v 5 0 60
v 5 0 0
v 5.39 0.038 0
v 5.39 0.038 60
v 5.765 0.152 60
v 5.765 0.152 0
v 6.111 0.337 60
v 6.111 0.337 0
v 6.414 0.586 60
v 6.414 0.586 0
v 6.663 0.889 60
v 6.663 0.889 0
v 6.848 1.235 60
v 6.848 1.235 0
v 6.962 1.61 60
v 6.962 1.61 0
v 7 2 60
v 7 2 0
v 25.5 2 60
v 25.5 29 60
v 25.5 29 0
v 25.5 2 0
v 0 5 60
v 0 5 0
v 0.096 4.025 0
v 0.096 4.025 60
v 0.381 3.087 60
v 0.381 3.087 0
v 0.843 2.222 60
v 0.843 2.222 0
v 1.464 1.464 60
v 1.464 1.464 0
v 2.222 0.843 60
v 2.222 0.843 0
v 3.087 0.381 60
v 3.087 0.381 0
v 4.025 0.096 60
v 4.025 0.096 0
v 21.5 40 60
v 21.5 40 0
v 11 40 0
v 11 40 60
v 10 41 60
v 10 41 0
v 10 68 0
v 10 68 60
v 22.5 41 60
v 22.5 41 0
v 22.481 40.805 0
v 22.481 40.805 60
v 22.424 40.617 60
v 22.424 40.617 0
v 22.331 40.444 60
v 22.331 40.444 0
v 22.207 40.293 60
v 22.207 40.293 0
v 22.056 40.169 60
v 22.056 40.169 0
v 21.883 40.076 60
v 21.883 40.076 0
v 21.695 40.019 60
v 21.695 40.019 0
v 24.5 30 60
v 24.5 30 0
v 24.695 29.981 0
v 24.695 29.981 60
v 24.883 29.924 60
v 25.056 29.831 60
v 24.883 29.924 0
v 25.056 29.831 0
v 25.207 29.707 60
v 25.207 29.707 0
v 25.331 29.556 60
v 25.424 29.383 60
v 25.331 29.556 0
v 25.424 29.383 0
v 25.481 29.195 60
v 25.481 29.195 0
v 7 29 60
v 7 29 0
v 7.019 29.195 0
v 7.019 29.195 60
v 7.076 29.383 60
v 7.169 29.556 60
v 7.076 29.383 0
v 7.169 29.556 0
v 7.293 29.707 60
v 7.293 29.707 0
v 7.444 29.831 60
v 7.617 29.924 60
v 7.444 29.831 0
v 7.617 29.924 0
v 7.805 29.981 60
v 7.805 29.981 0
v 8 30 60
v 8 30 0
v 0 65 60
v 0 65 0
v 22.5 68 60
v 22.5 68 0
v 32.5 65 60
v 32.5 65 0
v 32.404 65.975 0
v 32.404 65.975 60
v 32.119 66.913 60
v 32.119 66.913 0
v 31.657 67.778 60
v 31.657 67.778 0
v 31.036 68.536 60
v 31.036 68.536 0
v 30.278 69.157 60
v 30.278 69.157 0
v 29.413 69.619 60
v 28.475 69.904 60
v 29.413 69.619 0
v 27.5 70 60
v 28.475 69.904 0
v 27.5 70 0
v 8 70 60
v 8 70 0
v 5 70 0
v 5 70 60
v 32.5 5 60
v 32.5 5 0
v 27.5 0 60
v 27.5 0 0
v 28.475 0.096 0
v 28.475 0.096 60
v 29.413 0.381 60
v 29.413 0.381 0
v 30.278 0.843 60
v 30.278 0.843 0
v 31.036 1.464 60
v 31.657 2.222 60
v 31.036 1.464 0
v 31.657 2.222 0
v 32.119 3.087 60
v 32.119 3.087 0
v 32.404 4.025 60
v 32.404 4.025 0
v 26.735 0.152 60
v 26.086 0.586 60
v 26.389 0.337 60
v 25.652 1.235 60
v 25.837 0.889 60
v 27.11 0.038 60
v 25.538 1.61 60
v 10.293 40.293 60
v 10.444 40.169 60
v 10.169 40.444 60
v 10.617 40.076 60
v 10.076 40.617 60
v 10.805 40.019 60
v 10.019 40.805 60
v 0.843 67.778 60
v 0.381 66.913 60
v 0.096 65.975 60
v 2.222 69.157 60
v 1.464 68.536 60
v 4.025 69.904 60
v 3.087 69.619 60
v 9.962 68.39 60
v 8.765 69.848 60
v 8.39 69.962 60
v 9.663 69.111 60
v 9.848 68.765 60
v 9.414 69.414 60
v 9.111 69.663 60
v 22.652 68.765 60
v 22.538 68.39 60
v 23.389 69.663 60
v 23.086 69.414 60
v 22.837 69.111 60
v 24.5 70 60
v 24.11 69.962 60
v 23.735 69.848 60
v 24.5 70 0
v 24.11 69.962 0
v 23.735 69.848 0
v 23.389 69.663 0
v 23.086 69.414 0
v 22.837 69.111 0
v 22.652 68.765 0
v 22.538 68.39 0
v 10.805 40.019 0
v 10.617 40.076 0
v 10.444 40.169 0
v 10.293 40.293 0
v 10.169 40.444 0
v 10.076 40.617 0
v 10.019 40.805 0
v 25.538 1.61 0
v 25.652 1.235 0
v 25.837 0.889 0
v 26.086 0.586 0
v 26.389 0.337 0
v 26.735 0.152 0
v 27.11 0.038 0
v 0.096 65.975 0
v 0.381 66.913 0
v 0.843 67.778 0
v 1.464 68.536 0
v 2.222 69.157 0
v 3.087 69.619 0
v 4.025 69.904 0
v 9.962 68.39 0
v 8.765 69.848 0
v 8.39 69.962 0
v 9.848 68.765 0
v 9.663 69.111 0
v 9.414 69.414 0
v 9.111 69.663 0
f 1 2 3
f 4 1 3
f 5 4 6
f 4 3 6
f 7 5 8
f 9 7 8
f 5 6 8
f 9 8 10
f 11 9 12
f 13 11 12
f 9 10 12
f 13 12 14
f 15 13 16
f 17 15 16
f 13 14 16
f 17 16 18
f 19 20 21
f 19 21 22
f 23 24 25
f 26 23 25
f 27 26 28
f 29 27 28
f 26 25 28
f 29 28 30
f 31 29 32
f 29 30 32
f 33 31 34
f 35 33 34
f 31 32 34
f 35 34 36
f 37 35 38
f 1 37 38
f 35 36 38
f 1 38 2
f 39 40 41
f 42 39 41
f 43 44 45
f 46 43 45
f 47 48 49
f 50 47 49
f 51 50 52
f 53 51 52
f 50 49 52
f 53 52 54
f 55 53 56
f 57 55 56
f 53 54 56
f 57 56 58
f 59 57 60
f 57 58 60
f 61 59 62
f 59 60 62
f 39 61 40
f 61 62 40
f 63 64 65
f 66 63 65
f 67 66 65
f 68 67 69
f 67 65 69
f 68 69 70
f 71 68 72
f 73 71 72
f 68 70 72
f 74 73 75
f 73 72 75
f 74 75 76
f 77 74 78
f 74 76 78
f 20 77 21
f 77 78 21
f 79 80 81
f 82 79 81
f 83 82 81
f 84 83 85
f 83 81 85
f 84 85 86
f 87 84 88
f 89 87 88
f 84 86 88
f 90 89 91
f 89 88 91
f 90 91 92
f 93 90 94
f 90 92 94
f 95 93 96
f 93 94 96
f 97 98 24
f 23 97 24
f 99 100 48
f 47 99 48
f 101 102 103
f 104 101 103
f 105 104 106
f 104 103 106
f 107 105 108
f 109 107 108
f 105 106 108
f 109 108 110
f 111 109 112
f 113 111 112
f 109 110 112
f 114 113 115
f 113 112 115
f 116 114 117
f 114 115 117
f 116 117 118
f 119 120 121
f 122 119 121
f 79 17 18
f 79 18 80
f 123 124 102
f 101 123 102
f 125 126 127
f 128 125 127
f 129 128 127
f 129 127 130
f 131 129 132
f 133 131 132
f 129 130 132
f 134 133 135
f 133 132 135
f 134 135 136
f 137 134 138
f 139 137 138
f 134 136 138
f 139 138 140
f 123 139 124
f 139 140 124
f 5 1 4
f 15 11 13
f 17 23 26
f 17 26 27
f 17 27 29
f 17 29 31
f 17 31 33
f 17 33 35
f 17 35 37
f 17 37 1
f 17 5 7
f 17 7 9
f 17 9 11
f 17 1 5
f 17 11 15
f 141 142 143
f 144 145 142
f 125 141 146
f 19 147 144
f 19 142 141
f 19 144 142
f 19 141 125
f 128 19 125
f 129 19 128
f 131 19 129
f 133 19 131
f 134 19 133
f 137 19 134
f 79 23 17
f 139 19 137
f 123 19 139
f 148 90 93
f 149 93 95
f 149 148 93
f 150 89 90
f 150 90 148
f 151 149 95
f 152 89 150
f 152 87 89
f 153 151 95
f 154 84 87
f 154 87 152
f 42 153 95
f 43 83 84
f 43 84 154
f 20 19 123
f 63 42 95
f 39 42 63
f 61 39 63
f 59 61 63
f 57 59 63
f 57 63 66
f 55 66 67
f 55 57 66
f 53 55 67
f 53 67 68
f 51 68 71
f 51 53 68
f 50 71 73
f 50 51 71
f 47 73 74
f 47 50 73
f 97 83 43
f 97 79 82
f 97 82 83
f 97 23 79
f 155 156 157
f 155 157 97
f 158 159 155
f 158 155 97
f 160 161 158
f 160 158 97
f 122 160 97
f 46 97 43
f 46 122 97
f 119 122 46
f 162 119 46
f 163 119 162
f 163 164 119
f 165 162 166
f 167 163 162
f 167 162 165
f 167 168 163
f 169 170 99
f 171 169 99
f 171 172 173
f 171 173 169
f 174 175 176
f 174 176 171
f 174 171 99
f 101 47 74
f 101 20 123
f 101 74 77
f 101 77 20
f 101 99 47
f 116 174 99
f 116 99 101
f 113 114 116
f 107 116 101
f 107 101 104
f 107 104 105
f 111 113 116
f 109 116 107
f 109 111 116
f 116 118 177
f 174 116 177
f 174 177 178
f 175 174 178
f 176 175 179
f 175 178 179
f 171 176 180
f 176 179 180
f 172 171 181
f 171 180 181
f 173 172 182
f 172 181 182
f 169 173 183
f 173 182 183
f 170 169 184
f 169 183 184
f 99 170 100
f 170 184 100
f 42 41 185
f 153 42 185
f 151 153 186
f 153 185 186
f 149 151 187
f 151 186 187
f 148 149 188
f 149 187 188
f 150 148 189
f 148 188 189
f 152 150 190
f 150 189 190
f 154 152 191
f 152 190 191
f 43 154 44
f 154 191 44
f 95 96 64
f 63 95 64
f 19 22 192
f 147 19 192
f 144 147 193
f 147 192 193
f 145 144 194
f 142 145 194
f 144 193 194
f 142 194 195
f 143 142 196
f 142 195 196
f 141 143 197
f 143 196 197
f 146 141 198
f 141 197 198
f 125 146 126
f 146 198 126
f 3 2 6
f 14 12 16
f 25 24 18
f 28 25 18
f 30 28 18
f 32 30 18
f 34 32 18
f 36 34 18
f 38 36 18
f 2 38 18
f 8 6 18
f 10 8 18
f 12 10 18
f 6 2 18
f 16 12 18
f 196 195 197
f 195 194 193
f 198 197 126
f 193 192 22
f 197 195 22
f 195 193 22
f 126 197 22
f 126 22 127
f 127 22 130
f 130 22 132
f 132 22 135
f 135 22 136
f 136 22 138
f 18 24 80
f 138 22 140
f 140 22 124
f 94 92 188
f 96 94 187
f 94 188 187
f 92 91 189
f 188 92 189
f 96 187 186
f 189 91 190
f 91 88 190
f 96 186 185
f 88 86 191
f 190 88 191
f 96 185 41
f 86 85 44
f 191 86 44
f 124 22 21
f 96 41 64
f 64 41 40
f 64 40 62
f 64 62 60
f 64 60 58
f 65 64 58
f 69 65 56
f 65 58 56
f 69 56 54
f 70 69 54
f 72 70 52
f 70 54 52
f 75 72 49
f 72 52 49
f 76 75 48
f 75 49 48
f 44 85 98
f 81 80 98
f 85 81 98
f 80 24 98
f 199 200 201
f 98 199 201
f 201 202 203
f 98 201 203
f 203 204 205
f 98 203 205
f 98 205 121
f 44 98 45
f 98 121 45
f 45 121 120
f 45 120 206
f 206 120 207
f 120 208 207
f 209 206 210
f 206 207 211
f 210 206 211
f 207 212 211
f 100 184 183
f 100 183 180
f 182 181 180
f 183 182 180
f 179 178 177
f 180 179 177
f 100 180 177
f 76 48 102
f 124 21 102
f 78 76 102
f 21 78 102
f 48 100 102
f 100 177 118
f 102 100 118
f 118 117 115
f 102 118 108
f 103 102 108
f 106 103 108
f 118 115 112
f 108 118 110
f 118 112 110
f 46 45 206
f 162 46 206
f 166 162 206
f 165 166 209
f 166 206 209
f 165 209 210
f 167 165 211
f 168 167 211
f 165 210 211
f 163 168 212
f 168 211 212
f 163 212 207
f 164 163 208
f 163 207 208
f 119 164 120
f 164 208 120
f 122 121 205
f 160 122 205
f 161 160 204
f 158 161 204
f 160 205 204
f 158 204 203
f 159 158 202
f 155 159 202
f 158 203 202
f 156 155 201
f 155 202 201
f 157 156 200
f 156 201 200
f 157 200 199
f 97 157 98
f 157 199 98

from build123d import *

# Parameters (mm, degrees)
F1_DEPTH = 60


with BuildPart() as f1:
    # F0 (on Top) → F1 (new body)
    with BuildSketch(Plane.XY):
        with BuildLine():
            Line((0, 65), (0, 5))
            ThreePointArc((0, 5), (1.464466, 1.464466), (5, 0))
            ThreePointArc((5, 0), (6.414214, 0.585786), (7, 2))
            Line((7, 2), (7, 29))
            ThreePointArc((7, 29), (7.292893, 29.707107), (8, 30))
            Line((8, 30), (24.5, 30))
            ThreePointArc((24.5, 30), (25.207107, 29.707107), (25.5, 29))
            Line((25.5, 29), (25.5, 2))
            ThreePointArc((25.5, 2), (26.085786, 0.585786), (27.5, 0))
            ThreePointArc((27.5, 0), (31.035534, 1.464466), (32.5, 5))
            Line((32.5, 5), (32.5, 65))
            ThreePointArc((32.5, 65), (31.035534, 68.535534), (27.5, 70))
            Line((27.5, 70), (24.5, 70))
            ThreePointArc((24.5, 70), (23.085786, 69.414214), (22.5, 68))
            Line((22.5, 68), (22.5, 41))
            ThreePointArc((22.5, 41), (22.207107, 40.292893), (21.5, 40))
            Line((21.5, 40), (11, 40))
            ThreePointArc((11, 40), (10.292893, 40.292893), (10, 41))
            Line((10, 41), (10, 68))
            ThreePointArc((10, 68), (9.414214, 69.414214), (8, 70))
            Line((8, 70), (5, 70))
            ThreePointArc((5, 70), (1.464466, 68.535534), (0, 65))
        make_face()
    extrude(amount=F1_DEPTH)


solid = f1.part
